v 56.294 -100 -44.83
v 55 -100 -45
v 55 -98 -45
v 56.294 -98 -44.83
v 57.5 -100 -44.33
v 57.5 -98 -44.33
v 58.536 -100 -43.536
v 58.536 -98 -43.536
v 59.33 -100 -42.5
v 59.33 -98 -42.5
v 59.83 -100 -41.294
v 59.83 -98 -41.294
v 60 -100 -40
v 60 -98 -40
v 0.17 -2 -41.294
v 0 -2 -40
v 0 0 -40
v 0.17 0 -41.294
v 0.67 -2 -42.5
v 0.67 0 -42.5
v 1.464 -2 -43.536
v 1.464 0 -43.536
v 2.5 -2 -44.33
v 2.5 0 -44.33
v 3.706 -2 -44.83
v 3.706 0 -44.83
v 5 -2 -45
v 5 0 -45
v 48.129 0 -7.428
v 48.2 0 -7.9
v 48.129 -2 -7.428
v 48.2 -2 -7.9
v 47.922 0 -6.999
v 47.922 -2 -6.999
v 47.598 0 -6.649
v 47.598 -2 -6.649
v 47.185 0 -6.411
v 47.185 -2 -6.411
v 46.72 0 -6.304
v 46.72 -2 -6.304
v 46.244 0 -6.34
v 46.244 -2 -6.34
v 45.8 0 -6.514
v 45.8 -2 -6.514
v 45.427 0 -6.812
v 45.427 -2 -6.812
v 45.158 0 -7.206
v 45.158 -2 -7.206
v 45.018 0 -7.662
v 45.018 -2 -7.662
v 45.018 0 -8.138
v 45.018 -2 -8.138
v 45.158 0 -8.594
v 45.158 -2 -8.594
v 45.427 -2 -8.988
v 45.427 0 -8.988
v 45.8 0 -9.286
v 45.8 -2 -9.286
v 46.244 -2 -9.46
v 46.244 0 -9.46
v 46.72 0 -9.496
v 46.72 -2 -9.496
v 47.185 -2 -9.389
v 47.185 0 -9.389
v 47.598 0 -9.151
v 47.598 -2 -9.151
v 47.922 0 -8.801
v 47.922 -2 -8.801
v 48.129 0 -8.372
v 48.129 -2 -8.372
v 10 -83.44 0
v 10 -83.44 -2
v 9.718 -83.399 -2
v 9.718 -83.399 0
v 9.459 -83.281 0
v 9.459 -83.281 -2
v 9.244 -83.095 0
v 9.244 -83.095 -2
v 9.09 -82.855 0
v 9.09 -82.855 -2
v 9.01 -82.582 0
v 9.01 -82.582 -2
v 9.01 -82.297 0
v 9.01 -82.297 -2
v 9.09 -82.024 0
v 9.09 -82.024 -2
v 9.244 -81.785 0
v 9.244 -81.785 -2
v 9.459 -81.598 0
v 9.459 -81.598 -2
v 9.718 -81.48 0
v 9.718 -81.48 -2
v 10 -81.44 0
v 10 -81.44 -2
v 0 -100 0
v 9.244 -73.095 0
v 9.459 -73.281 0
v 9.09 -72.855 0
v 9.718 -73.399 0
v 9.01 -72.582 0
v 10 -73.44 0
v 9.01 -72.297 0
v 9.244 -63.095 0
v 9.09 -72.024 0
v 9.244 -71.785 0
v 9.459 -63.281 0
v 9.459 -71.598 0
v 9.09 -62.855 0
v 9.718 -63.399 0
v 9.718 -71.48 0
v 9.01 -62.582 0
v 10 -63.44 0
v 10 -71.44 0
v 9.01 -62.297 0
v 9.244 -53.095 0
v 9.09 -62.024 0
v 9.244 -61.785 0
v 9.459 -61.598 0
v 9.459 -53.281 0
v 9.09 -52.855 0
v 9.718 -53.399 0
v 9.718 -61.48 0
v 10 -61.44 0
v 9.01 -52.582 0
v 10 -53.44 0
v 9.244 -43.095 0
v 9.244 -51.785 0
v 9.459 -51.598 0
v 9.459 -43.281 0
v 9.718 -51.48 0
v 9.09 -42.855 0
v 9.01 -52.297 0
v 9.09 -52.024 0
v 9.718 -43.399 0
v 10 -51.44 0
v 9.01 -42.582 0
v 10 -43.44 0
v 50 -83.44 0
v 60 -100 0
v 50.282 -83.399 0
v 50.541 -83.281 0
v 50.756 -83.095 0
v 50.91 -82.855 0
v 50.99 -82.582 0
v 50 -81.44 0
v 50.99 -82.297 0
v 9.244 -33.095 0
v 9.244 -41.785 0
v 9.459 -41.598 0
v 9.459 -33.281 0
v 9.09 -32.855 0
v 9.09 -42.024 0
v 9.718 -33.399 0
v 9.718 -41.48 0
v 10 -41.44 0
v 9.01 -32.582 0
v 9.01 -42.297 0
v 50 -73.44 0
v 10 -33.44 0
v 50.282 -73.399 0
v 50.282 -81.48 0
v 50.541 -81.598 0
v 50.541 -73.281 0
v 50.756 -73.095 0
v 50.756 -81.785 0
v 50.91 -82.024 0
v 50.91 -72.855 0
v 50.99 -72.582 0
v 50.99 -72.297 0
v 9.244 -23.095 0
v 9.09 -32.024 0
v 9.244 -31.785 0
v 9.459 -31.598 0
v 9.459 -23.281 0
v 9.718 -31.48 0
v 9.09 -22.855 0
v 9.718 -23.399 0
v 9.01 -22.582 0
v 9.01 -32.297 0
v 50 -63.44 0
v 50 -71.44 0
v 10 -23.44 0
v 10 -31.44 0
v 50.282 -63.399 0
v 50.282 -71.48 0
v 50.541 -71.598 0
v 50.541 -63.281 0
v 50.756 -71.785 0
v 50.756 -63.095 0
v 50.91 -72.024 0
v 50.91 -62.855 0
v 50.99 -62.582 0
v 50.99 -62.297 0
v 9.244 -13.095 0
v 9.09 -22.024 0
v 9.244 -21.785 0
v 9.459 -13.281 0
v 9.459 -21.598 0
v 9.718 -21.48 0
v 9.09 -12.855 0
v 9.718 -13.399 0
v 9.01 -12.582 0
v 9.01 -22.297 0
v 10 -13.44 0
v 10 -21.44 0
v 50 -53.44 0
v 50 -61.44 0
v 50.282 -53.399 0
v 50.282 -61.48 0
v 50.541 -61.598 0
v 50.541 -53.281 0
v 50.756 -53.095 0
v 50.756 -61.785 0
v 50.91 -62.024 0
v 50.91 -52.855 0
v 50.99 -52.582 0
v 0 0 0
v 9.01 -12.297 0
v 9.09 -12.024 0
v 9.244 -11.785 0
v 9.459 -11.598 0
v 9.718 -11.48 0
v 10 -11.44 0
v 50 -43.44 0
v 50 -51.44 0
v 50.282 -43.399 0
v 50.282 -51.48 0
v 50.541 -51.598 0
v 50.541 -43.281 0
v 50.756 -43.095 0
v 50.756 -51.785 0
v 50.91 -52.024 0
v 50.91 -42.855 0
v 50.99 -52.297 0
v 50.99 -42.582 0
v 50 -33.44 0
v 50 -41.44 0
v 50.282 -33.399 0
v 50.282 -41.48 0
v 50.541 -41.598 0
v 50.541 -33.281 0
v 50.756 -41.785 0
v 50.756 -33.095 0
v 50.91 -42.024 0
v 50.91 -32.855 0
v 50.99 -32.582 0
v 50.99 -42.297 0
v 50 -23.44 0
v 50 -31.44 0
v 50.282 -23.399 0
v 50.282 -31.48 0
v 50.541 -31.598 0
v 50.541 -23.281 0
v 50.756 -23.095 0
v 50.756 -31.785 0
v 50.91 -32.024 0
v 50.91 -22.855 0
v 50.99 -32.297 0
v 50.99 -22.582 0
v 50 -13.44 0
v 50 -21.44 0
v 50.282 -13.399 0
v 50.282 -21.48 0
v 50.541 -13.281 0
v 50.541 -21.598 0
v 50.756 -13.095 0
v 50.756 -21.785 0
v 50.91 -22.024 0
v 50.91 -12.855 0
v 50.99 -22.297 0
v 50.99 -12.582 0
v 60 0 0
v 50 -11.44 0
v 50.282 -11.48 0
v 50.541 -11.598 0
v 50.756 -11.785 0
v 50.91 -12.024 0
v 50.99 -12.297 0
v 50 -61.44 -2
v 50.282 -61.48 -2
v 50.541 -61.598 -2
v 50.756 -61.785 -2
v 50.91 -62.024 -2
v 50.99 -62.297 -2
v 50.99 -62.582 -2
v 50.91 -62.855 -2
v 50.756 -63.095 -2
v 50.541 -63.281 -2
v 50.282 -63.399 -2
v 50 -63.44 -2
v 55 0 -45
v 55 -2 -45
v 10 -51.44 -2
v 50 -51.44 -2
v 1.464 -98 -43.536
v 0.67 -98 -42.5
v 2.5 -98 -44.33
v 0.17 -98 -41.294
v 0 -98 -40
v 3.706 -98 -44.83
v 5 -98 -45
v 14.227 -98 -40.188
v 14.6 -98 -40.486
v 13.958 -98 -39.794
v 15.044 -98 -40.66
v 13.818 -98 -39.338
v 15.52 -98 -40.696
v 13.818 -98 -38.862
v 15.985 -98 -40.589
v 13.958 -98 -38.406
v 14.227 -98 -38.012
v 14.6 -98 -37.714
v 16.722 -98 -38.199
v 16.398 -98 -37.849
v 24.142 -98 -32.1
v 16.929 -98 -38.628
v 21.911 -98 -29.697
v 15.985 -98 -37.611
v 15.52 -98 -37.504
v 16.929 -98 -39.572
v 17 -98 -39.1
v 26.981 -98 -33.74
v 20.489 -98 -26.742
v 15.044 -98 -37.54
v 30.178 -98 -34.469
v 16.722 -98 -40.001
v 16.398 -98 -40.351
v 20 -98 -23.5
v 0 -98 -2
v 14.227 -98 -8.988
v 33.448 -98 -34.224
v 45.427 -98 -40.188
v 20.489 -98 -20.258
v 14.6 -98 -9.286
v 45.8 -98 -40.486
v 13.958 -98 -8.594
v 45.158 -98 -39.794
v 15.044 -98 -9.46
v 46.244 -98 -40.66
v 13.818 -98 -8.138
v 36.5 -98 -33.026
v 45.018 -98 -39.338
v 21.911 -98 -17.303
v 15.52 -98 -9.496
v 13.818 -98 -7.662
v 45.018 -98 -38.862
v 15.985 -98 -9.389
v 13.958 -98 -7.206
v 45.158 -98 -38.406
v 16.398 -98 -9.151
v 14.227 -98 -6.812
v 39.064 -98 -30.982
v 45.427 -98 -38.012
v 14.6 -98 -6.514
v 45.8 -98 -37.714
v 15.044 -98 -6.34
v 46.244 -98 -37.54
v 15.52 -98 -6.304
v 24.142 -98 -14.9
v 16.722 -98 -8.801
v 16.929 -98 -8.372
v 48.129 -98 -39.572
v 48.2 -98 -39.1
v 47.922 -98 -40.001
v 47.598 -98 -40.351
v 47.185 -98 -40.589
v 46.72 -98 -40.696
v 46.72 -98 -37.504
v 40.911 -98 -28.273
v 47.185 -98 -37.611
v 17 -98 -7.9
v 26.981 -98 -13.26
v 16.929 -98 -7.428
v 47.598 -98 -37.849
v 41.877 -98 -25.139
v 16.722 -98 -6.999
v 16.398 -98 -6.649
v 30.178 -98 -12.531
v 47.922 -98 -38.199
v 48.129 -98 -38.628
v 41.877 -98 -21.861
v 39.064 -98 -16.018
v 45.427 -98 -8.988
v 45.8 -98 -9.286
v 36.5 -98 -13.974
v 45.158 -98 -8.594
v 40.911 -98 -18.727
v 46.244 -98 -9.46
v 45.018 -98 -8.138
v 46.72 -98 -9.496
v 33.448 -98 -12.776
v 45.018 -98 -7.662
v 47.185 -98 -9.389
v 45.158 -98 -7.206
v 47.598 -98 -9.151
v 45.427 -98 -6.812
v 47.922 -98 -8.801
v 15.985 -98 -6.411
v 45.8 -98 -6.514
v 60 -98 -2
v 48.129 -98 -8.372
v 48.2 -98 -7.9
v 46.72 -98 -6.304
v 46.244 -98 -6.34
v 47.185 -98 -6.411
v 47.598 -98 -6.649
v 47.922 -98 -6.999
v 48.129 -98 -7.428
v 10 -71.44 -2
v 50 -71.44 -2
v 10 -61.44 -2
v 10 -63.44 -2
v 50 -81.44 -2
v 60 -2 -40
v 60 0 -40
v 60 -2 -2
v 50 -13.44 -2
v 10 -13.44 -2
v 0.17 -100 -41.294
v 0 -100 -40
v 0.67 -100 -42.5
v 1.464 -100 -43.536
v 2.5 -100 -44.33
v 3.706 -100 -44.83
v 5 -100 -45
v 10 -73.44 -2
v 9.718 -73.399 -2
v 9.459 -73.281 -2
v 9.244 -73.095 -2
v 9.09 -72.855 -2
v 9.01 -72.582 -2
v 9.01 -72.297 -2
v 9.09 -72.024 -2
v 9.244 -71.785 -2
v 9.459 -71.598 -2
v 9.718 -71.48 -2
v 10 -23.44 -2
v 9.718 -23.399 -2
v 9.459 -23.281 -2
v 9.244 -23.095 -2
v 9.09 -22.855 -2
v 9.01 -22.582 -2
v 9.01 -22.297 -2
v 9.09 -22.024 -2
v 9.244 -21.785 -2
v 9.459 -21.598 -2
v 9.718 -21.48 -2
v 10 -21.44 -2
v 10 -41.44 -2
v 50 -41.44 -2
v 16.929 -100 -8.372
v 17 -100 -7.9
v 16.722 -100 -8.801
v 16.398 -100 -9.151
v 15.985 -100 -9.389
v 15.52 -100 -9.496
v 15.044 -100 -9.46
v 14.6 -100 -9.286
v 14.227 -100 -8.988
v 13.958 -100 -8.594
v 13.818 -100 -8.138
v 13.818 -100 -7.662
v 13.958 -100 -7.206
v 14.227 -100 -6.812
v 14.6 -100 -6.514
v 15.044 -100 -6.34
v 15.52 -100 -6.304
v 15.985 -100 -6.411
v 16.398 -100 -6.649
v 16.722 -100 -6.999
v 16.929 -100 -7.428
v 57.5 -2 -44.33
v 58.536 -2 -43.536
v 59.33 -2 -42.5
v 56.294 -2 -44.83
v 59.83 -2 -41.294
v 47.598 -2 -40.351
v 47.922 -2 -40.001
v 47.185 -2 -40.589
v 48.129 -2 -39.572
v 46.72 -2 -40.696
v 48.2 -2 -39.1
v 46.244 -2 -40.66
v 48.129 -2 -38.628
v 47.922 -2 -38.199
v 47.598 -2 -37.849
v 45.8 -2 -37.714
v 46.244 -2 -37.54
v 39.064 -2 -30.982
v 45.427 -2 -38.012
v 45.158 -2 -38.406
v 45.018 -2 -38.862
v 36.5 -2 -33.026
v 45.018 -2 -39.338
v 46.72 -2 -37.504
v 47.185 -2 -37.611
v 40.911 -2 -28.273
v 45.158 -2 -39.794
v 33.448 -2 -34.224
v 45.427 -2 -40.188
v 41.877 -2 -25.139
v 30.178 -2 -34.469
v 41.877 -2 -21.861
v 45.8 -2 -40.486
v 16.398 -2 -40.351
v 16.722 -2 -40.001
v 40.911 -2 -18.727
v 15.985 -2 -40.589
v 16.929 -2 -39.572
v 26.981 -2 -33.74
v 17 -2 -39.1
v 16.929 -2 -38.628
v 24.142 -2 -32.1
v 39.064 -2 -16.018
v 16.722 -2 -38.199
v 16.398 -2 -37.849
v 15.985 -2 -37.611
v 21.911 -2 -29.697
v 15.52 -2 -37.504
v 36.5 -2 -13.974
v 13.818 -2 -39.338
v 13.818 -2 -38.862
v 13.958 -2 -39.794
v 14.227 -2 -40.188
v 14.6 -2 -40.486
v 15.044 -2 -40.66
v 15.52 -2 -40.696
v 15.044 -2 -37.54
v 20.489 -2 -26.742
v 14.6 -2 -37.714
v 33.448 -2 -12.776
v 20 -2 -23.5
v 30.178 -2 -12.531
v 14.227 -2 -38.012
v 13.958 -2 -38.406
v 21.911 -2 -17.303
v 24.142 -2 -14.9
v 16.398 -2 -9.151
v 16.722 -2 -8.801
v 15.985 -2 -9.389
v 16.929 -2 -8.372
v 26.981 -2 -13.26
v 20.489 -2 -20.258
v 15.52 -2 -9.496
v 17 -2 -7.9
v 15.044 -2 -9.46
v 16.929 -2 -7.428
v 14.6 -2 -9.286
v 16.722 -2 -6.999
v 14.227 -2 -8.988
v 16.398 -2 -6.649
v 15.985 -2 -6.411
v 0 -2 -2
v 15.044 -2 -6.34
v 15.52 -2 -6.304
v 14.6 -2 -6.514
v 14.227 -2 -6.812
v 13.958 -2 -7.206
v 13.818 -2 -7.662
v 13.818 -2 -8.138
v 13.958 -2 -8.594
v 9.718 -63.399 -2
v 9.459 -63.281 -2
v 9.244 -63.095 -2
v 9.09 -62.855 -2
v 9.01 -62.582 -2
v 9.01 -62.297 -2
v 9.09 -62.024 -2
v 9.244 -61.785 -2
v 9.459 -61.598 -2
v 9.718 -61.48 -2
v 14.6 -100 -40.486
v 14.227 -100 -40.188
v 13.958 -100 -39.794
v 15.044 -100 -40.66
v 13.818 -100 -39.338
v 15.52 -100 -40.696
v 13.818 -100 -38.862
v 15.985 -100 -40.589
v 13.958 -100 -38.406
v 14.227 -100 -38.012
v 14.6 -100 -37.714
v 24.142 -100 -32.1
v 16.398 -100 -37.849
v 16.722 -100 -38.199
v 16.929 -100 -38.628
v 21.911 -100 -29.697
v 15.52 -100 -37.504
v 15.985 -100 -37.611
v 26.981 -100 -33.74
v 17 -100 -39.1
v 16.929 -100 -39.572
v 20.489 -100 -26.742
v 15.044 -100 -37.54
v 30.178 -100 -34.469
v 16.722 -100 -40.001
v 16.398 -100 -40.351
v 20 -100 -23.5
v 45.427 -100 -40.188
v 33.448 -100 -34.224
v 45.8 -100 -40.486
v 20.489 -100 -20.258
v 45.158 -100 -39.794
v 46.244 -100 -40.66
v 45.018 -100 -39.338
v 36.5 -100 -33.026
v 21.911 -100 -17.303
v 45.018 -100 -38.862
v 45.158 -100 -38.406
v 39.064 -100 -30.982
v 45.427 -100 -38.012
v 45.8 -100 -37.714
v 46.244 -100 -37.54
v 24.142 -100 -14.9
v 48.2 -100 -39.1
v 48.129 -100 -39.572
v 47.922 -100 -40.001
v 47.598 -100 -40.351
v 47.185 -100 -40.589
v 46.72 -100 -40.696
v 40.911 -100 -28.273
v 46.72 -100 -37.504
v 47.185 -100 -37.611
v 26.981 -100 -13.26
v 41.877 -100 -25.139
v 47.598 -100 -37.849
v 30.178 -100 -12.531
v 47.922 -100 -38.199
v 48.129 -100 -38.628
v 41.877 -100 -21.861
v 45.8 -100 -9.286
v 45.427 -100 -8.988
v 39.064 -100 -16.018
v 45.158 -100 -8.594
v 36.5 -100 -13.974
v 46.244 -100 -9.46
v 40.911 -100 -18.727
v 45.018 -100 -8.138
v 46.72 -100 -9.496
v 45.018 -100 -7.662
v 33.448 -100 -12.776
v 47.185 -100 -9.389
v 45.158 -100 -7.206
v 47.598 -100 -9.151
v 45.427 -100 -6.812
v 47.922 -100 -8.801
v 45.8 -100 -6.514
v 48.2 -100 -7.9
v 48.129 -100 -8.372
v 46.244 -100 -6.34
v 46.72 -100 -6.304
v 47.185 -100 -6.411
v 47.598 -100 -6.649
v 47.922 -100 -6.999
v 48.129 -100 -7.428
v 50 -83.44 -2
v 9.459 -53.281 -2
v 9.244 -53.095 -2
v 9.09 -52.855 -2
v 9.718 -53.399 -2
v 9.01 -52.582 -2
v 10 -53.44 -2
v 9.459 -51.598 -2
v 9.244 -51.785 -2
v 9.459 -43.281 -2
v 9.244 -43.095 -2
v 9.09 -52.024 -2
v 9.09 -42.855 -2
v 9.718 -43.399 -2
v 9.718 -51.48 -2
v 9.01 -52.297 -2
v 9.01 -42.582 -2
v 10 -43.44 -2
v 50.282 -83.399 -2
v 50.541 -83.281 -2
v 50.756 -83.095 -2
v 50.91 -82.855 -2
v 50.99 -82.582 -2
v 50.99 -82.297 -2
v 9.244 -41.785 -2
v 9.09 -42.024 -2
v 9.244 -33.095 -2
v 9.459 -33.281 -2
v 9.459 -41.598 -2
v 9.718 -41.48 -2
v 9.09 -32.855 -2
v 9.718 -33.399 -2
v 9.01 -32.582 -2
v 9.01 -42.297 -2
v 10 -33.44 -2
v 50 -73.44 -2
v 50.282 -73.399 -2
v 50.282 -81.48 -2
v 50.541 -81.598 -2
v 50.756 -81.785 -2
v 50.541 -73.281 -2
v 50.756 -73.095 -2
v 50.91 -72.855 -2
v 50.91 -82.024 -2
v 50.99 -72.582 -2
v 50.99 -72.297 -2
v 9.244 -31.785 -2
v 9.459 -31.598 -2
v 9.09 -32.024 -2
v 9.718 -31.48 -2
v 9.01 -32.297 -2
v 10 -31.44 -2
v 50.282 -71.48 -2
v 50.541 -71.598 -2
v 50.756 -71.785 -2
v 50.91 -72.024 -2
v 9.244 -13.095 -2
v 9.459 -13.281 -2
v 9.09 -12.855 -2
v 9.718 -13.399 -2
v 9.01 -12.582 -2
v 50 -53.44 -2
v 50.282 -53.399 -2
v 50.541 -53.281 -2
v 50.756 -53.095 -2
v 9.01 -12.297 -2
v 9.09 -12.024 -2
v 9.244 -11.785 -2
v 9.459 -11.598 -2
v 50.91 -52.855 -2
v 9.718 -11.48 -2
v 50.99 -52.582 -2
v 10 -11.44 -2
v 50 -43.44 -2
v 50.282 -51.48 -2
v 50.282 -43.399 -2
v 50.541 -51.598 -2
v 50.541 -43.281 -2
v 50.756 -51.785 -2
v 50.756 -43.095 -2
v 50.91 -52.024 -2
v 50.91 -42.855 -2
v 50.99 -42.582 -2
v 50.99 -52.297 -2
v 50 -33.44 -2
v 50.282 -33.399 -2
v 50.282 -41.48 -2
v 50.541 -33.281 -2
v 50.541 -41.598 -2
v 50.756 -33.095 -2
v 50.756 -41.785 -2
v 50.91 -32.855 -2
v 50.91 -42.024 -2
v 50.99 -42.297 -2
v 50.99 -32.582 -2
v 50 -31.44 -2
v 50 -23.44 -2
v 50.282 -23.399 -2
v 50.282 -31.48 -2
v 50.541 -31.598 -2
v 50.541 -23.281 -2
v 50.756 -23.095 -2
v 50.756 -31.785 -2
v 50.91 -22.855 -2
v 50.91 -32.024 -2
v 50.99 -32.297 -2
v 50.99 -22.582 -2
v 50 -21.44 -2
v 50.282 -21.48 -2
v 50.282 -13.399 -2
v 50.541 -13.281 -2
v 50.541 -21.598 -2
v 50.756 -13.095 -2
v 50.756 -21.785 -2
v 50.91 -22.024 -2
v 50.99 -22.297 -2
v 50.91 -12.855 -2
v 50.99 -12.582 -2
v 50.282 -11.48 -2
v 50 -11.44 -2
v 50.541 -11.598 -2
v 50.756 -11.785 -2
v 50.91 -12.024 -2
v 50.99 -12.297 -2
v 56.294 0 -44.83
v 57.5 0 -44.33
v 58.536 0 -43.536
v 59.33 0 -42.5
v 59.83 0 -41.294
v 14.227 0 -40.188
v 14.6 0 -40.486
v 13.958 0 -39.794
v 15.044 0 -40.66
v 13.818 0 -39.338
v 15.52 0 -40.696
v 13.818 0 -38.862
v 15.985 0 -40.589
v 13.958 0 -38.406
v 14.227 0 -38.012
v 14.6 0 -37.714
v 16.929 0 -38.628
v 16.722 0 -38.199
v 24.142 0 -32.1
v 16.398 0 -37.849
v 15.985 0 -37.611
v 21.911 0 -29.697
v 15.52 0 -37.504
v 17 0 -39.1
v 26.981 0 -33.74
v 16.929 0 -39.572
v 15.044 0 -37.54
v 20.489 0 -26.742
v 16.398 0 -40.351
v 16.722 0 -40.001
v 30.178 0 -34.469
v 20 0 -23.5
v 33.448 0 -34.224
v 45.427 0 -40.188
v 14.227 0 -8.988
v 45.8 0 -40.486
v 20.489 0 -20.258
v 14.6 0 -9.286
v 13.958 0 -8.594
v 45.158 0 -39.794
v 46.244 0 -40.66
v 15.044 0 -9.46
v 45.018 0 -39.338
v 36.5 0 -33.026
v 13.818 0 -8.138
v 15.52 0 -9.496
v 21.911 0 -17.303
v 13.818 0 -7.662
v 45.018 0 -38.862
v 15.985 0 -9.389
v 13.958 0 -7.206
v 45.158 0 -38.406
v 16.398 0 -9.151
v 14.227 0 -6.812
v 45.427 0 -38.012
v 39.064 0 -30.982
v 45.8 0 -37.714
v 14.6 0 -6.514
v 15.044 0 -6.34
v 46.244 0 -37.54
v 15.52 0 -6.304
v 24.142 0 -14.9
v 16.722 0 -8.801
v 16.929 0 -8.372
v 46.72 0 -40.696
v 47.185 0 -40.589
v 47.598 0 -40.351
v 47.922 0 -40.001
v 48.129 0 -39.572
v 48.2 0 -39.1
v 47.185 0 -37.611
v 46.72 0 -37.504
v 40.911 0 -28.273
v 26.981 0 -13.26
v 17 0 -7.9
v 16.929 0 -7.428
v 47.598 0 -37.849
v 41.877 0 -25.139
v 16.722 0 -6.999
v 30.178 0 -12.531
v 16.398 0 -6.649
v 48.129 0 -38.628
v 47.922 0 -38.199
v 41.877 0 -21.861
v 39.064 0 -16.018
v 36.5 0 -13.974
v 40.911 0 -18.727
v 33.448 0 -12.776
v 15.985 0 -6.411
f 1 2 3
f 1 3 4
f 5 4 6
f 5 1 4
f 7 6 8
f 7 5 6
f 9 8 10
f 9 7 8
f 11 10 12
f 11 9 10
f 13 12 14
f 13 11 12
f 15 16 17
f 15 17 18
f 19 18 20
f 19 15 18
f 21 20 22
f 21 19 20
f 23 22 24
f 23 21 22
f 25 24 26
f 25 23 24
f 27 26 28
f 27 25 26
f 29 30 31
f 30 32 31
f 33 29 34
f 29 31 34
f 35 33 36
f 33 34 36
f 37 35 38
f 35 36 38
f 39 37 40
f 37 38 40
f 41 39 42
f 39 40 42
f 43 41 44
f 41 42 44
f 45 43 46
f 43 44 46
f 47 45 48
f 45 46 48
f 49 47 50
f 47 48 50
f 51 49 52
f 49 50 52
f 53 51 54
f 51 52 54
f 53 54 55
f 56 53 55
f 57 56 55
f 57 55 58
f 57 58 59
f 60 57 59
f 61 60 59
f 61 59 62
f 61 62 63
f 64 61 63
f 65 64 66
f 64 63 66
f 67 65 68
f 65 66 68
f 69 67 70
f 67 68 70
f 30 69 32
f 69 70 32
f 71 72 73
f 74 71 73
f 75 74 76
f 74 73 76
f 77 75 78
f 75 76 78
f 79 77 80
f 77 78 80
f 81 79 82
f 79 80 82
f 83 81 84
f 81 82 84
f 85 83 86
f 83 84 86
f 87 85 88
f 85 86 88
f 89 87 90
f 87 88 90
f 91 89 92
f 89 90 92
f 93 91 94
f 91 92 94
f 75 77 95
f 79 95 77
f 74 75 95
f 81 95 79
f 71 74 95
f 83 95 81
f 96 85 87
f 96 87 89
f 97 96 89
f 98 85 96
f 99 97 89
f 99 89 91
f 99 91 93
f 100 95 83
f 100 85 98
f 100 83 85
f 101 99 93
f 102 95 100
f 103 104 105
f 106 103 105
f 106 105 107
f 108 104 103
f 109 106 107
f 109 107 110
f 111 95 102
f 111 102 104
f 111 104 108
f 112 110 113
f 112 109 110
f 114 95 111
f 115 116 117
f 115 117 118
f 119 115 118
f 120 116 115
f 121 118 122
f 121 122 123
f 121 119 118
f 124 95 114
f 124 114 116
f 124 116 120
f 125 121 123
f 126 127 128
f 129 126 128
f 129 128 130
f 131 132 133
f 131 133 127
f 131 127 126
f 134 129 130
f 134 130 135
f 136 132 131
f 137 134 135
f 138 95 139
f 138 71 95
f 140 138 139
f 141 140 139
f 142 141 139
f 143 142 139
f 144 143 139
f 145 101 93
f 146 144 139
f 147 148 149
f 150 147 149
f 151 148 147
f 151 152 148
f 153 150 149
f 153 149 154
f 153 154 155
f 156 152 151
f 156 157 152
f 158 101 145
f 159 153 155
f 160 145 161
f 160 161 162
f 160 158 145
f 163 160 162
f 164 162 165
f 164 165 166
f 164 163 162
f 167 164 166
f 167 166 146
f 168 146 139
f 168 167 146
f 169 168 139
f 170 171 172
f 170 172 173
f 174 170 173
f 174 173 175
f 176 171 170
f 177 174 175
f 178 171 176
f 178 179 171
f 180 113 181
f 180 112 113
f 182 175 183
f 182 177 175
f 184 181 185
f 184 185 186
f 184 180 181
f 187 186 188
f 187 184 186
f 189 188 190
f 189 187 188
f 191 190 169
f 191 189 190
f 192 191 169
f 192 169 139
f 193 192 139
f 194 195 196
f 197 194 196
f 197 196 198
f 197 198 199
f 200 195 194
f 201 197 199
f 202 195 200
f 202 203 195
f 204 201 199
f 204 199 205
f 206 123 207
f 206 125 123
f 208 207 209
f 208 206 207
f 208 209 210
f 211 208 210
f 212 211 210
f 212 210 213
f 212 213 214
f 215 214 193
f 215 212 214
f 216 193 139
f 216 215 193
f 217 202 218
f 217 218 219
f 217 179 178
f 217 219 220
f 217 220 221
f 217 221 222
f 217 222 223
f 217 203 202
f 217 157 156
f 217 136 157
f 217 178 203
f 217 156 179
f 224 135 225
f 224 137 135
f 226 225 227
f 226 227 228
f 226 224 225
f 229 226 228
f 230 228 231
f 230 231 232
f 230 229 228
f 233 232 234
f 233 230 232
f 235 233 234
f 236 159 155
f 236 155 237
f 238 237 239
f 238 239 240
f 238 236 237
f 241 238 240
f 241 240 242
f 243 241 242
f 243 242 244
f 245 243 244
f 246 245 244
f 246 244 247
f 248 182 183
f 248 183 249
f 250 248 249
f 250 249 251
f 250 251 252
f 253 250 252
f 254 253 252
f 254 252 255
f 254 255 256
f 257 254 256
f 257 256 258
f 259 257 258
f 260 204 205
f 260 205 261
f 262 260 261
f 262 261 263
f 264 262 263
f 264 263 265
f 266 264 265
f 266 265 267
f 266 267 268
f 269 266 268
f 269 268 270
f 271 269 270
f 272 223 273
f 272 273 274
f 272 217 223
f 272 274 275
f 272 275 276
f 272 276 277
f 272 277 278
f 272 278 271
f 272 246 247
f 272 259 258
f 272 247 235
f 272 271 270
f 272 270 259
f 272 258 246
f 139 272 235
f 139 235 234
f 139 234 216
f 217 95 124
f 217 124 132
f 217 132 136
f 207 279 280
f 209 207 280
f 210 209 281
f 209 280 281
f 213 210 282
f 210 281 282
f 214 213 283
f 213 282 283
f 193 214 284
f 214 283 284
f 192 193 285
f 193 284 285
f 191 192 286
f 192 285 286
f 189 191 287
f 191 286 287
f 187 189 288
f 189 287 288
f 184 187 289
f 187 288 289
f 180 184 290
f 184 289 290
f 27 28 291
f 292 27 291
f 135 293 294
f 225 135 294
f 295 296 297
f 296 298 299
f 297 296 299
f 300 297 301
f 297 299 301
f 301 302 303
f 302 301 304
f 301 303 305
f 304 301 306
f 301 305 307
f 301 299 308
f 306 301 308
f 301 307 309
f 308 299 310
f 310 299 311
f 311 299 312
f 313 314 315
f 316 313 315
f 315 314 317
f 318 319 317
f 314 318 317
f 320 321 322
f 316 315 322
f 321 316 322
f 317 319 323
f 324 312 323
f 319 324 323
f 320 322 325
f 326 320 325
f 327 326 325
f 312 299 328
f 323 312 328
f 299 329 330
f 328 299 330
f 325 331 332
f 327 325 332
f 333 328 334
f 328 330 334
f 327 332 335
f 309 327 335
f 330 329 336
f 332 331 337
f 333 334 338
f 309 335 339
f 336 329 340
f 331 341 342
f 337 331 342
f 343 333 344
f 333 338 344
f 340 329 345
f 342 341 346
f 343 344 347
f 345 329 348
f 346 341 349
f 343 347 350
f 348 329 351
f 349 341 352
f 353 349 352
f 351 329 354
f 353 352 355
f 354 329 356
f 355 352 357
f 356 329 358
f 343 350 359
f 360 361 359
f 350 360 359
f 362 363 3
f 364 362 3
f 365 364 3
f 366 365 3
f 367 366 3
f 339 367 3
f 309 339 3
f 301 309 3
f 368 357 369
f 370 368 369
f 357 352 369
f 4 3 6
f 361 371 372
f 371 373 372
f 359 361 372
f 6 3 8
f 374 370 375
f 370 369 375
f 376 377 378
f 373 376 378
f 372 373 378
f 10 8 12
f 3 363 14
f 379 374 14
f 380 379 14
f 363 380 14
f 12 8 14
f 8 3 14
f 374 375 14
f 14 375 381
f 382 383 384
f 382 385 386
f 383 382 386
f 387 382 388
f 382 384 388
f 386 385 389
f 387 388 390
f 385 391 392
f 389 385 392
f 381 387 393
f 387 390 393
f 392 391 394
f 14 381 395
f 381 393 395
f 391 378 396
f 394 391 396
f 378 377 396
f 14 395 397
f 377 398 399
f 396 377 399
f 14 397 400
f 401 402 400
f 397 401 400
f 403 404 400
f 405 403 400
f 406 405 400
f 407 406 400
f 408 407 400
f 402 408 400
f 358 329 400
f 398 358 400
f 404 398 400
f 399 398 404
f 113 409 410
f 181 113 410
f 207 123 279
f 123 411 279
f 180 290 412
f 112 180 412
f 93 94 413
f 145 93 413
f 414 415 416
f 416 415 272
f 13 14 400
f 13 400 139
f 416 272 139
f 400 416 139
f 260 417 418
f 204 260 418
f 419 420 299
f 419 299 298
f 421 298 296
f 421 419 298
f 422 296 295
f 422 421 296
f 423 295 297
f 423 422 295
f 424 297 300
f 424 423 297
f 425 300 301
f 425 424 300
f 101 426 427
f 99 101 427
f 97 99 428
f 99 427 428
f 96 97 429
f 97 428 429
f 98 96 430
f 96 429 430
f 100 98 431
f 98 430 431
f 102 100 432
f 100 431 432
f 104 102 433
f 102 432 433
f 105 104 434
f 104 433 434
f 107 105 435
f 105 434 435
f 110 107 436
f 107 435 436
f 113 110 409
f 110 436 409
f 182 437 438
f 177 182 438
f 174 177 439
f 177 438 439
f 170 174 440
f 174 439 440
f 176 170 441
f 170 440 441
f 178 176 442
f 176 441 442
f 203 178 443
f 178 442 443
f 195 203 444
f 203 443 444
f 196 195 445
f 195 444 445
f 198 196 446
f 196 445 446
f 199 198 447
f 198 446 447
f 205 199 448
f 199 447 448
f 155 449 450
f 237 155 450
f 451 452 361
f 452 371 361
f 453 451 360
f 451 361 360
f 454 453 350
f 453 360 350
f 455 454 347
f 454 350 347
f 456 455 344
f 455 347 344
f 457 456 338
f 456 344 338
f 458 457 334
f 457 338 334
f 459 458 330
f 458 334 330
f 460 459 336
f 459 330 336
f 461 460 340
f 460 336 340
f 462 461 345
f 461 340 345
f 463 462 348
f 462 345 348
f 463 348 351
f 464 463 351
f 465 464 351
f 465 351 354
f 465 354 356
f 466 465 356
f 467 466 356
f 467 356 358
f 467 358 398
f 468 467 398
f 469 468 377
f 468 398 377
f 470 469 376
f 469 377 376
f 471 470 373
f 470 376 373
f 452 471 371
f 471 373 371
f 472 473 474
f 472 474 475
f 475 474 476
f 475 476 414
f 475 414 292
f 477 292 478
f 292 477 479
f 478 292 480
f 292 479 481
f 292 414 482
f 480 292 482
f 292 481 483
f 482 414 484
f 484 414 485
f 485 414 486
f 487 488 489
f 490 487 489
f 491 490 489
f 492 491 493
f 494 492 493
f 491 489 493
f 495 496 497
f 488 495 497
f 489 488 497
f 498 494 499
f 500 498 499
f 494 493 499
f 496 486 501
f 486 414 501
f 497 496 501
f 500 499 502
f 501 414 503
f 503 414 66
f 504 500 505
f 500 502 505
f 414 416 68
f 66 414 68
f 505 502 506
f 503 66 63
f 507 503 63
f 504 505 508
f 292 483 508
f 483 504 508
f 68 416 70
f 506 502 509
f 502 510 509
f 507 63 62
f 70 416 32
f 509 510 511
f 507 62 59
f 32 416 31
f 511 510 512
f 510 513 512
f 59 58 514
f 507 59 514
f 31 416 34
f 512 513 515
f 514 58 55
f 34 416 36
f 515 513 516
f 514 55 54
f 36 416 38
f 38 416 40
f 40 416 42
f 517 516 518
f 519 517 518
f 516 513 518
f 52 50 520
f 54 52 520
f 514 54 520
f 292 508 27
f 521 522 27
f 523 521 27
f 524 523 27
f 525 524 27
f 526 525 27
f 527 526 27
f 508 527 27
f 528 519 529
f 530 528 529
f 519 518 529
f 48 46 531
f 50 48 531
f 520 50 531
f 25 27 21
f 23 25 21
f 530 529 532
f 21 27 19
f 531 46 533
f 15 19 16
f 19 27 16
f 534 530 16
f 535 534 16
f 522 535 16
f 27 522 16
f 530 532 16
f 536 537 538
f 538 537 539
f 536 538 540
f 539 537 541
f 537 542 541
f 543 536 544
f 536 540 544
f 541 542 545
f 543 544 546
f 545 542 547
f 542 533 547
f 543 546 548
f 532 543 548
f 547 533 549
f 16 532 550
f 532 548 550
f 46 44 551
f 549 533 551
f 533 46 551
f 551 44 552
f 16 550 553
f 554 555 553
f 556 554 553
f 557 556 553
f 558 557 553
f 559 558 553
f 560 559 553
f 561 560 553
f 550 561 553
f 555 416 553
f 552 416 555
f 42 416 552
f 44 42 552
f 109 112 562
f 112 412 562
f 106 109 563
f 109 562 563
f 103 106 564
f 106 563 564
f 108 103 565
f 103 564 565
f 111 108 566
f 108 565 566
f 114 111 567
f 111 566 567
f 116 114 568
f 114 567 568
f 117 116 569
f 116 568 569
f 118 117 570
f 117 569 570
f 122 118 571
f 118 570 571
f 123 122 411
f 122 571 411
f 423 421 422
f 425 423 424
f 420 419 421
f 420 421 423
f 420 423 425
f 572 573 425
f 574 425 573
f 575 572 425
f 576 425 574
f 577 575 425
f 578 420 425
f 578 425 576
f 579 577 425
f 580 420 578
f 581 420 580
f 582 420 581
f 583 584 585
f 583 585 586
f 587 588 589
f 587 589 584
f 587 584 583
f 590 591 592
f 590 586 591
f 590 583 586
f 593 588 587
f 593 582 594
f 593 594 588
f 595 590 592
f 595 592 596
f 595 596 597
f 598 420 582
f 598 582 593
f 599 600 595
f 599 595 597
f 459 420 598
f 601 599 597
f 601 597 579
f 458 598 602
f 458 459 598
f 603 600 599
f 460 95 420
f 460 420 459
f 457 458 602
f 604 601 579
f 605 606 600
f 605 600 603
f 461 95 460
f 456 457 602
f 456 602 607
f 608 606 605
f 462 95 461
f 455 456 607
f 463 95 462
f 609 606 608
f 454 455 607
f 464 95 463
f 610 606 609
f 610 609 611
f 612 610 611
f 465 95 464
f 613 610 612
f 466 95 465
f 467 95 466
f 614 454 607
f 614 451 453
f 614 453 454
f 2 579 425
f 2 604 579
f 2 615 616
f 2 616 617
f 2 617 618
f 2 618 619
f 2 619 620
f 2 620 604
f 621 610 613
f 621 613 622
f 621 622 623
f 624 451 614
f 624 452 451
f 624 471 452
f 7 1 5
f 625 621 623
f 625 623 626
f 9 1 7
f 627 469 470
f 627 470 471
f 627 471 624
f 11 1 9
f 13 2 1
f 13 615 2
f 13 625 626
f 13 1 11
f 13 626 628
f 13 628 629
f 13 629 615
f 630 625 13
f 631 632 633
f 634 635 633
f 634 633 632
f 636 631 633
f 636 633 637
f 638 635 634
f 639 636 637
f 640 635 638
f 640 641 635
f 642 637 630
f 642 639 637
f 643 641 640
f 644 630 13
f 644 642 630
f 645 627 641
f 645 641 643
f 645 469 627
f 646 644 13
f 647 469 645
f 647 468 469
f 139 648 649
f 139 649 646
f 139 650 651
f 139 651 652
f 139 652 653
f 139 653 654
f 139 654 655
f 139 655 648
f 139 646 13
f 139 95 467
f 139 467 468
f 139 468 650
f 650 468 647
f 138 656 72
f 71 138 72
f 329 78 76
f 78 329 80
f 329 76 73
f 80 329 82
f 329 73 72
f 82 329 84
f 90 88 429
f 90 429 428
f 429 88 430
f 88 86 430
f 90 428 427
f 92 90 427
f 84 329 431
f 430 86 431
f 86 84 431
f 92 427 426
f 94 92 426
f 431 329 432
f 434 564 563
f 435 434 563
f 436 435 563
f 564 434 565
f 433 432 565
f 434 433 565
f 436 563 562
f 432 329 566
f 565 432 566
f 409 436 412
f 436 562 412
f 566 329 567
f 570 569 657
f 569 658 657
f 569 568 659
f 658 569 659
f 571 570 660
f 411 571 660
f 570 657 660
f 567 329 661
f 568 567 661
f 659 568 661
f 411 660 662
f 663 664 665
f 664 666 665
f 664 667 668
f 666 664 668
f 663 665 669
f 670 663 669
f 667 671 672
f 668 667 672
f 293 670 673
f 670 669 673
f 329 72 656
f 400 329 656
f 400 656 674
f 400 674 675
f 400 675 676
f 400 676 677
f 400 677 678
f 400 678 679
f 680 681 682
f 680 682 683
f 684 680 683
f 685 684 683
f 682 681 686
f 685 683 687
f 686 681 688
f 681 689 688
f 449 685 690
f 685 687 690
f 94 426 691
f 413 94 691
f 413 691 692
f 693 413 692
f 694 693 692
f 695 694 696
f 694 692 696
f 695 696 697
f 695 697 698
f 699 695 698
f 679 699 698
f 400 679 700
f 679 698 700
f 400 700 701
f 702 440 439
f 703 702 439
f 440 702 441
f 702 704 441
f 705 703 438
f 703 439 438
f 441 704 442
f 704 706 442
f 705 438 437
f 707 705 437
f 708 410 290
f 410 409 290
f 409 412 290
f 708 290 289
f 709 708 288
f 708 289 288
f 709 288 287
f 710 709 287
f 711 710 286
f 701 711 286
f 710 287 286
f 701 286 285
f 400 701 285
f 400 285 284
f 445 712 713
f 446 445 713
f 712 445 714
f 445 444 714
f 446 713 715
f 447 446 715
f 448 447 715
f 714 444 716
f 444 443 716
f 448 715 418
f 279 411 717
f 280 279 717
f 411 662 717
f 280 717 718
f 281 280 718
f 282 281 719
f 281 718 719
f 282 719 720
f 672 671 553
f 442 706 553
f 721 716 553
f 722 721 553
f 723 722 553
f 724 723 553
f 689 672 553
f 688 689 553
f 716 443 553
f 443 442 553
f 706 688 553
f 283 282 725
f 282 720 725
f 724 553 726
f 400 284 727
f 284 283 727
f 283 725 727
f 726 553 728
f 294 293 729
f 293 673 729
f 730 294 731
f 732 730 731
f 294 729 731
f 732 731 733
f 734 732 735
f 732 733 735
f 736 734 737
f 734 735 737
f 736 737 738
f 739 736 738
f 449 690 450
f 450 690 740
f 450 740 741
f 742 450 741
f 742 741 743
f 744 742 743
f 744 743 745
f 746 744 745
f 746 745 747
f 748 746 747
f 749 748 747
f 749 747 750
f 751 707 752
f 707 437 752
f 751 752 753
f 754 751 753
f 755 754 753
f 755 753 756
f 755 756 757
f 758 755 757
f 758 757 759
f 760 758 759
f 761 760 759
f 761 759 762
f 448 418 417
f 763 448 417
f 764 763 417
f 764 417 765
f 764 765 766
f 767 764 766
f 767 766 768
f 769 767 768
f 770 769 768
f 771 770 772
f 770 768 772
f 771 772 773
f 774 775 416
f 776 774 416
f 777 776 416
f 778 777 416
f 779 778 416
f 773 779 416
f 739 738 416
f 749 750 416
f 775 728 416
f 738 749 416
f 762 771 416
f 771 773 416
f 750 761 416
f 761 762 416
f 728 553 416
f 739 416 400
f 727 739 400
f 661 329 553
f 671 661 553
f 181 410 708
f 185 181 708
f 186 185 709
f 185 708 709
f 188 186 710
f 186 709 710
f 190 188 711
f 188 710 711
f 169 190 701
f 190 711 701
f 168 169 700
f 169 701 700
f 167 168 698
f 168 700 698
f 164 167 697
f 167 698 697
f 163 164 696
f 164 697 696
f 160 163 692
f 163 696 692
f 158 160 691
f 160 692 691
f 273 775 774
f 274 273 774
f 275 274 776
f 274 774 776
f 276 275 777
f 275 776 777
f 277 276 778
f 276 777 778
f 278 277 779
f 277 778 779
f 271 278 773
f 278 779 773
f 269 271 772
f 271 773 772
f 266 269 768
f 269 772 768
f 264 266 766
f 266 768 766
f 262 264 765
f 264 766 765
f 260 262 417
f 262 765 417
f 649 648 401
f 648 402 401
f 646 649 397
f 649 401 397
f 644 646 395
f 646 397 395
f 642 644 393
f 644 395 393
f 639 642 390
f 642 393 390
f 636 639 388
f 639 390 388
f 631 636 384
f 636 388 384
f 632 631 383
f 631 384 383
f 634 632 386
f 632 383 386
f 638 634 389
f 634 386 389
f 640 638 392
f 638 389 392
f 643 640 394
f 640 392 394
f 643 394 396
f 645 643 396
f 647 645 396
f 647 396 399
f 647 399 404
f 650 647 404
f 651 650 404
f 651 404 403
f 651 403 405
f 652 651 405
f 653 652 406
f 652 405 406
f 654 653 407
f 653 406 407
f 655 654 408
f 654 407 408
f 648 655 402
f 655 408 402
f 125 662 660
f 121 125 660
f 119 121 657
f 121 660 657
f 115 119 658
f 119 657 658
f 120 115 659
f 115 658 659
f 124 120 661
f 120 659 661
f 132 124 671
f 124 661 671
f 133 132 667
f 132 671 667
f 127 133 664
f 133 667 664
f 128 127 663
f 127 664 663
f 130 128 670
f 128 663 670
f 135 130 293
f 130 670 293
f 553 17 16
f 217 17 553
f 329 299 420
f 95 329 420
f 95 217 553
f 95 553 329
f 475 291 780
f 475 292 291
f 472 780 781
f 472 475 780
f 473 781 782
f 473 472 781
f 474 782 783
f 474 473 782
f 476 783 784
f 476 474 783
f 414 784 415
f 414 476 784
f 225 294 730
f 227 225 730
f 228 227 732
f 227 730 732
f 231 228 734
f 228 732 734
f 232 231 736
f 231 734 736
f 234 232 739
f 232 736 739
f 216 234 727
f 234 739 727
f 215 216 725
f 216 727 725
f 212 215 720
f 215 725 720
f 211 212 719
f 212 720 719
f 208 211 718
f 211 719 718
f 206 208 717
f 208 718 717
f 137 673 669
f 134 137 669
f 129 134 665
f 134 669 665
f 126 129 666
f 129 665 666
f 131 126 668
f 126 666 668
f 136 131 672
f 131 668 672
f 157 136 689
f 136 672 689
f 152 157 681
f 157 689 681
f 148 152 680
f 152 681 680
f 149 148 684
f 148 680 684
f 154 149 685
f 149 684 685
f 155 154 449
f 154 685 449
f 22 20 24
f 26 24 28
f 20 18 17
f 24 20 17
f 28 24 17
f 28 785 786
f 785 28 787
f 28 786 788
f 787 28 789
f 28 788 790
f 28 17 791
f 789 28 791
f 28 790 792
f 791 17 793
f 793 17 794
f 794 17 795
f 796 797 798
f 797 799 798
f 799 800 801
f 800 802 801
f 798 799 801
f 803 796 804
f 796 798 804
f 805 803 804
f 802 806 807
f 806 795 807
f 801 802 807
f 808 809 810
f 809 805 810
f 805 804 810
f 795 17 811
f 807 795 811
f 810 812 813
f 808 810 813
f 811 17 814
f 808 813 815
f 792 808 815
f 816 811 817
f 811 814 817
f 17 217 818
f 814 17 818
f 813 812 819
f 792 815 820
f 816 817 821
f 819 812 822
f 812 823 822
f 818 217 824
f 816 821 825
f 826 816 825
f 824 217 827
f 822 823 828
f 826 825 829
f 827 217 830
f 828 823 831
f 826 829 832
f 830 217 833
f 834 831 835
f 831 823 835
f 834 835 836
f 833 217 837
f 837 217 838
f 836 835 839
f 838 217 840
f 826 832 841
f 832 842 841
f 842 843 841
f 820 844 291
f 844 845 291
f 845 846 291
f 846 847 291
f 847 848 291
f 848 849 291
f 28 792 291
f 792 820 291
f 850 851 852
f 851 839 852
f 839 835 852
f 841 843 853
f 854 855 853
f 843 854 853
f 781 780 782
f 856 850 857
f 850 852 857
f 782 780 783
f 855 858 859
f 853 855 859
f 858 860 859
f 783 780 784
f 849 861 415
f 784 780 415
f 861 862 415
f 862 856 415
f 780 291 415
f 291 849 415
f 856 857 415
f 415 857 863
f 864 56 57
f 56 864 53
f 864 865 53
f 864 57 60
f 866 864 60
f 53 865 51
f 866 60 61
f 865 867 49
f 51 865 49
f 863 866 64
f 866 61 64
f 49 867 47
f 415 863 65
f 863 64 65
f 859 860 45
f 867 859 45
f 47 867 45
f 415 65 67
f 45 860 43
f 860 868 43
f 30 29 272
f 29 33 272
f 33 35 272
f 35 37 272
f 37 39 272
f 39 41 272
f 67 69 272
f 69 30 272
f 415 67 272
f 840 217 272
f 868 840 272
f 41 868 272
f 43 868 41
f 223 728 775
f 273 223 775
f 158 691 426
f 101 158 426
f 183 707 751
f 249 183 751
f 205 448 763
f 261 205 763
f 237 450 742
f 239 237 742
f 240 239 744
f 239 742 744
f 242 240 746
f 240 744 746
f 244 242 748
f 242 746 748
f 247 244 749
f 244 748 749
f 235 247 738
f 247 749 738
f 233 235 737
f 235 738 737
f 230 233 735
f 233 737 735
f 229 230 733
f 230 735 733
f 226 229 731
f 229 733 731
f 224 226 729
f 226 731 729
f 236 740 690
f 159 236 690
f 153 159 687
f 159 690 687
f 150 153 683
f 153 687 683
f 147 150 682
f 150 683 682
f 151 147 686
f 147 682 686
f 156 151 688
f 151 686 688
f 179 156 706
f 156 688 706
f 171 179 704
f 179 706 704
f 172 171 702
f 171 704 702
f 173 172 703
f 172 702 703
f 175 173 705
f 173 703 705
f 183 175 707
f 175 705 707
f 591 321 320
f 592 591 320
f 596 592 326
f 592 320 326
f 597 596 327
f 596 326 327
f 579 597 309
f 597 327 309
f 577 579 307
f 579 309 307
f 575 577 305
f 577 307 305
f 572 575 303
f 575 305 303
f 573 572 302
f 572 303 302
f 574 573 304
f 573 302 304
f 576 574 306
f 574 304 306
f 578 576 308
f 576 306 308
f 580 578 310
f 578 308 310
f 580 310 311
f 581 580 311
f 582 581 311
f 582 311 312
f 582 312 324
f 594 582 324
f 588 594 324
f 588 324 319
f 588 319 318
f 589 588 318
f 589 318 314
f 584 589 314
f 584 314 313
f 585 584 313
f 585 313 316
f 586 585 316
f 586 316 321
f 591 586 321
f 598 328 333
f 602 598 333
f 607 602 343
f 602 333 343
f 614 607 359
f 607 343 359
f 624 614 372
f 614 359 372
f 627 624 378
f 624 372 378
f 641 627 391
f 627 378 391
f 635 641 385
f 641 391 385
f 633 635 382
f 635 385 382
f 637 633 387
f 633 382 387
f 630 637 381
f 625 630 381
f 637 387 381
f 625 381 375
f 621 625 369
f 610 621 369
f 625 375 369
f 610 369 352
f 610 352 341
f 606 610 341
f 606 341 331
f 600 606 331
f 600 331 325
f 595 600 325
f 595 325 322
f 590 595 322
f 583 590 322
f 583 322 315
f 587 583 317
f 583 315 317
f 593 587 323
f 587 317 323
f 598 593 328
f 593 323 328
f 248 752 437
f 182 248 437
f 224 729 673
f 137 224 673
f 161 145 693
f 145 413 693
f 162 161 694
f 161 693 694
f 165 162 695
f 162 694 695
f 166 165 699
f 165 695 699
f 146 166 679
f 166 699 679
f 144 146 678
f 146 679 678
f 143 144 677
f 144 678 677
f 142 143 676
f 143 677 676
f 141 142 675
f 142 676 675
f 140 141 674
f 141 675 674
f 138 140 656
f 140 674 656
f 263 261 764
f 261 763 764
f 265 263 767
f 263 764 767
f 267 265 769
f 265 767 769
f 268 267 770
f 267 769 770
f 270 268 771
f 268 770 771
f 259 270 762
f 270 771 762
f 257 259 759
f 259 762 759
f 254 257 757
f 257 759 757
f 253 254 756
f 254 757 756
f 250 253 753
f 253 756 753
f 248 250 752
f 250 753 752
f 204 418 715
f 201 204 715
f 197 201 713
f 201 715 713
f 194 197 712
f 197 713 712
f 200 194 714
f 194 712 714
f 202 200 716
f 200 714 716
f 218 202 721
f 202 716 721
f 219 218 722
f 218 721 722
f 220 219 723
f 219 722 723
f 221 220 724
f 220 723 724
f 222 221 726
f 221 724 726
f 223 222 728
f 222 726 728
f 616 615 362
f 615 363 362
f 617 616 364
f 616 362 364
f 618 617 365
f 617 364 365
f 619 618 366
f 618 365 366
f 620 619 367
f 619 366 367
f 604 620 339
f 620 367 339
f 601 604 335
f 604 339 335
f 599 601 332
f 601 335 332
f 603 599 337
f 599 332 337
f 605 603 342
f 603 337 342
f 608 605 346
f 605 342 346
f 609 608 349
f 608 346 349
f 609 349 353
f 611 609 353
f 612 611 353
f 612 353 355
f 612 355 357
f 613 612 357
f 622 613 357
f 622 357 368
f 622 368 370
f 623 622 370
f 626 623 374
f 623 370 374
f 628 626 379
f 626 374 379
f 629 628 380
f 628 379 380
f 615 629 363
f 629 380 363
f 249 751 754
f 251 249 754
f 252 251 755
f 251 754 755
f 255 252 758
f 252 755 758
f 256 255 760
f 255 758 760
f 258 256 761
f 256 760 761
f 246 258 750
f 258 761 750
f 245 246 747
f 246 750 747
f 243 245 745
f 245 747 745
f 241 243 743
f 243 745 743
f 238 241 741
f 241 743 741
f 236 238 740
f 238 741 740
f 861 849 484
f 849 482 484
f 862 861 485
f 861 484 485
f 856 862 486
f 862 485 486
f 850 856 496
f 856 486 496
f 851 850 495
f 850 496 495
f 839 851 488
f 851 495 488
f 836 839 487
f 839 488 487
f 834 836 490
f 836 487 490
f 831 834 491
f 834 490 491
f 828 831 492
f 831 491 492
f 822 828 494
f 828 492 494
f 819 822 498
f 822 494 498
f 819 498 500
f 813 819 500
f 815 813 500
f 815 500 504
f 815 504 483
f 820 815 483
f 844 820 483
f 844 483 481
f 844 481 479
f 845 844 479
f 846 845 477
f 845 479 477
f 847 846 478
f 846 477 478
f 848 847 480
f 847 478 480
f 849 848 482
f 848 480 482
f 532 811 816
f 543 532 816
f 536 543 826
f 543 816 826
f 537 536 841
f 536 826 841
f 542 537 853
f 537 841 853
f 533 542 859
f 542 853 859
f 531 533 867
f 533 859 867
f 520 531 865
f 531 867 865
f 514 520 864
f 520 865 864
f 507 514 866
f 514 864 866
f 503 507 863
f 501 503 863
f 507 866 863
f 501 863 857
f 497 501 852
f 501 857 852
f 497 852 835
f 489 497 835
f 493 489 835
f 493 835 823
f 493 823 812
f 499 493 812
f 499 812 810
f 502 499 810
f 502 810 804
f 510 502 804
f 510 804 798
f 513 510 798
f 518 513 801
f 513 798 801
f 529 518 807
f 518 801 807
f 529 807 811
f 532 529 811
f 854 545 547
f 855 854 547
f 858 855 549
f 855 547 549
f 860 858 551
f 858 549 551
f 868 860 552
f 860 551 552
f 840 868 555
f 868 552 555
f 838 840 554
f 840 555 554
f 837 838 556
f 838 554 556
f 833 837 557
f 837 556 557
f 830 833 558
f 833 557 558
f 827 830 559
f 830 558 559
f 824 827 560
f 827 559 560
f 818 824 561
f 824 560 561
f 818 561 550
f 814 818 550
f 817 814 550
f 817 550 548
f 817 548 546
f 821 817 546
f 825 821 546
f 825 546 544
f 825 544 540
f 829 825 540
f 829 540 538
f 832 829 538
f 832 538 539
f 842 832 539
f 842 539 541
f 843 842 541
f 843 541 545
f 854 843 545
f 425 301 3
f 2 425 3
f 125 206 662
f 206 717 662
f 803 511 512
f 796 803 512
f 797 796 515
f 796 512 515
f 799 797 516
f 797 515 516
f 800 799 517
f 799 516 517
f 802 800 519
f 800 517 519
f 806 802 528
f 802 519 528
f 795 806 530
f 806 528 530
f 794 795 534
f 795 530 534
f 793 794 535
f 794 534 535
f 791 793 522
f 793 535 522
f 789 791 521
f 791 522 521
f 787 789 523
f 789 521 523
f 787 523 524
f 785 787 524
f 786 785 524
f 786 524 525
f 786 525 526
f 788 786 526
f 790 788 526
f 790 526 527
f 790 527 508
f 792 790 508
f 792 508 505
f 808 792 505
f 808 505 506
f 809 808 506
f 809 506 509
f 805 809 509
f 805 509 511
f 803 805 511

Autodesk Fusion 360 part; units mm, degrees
sketch "Boceto6" plane through (0, 0, 0) normal (0, 0, 1) x (1, 0, 0)
  line L0 (0, 0) -> (60, 0)
  line L1 (60, 0) -> (60, -100)
  line L2 (0, 0) -> (0, -100)
  line L3 (0, -100) -> (60, -100)
  line L4 (0, 0) -> (60, 0)
  line L5 (60, 0) -> (60, -2)
  line L6 (60, -2) -> (0, -2)
  line L7 (0, -100) -> (0, -98.9254)
  line L8 (0, -100) -> (0, -98)
  line L9 (0, -98) -> (60, -98)
  line L10 (30, 0) -> (30, -104.8793) construction
  line L11 (50, -51.4397) -> (10, -51.4397) construction
  line L12 (10, -53.4397) -> (50, -53.4397) construction
  line L13 (10, -51.4397) -> (50, -51.4397)
  line L14 (50, -53.4397) -> (10, -53.4397)
  arc A0 (10, -51.4397) -> (10, -53.4397) centre (10, -52.4397) ccw
  arc A1 (50, -53.4397) -> (50, -51.4397) centre (50, -52.4397) ccw
  line L15 (10, -83.4397) -> (50, -83.4397) construction
  arc A2 (10, -81.4397) -> (10, -83.4397) centre (10, -82.4397) ccw
  arc A3 (50, -83.4397) -> (50, -81.4397) centre (50, -82.4397) ccw
  line L16 (50, -81.4397) -> (10, -81.4397) construction
  line L17 (10, -81.4397) -> (50, -81.4397)
  line L18 (50, -83.4397) -> (10, -83.4397)
  line L19 (10, -73.4397) -> (50, -73.4397) construction
  arc A4 (10, -71.4397) -> (10, -73.4397) centre (10, -72.4397) ccw
  arc A5 (50, -73.4397) -> (50, -71.4397) centre (50, -72.4397) ccw
  line L20 (50, -71.4397) -> (10, -71.4397) construction
  line L21 (10, -71.4397) -> (50, -71.4397)
  line L22 (50, -73.4397) -> (10, -73.4397)
  line L23 (10, -63.4397) -> (50, -63.4397) construction
  arc A6 (10, -61.4397) -> (10, -63.4397) centre (10, -62.4397) ccw
  arc A7 (50, -63.4397) -> (50, -61.4397) centre (50, -62.4397) ccw
  line L24 (50, -61.4397) -> (10, -61.4397) construction
  line L25 (10, -61.4397) -> (50, -61.4397)
  line L26 (50, -63.4397) -> (10, -63.4397)
  line L27 (10, -43.4397) -> (50, -43.4397) construction
  arc A8 (10, -41.4397) -> (10, -43.4397) centre (10, -42.4397) ccw
  arc A9 (50, -43.4397) -> (50, -41.4397) centre (50, -42.4397) ccw
  line L28 (50, -41.4397) -> (10, -41.4397) construction
  line L29 (10, -41.4397) -> (50, -41.4397)
  line L30 (50, -43.4397) -> (10, -43.4397)
  line L31 (10, -33.4397) -> (50, -33.4397) construction
  arc A10 (10, -31.4397) -> (10, -33.4397) centre (10, -32.4397) ccw
  arc A11 (50, -33.4397) -> (50, -31.4397) centre (50, -32.4397) ccw
  line L32 (50, -31.4397) -> (10, -31.4397) construction
  line L33 (10, -31.4397) -> (50, -31.4397)
  line L34 (50, -33.4397) -> (10, -33.4397)
  line L35 (10, -23.4397) -> (50, -23.4397) construction
  arc A12 (10, -21.4397) -> (10, -23.4397) centre (10, -22.4397) ccw
  arc A13 (50, -23.4397) -> (50, -21.4397) centre (50, -22.4397) ccw
  line L36 (50, -21.4397) -> (10, -21.4397) construction
  line L37 (10, -21.4397) -> (50, -21.4397)
  line L38 (50, -23.4397) -> (10, -23.4397)
  line L39 (10, -13.4397) -> (50, -13.4397) construction
  arc A14 (10, -11.4397) -> (10, -13.4397) centre (10, -12.4397) ccw
  arc A15 (50, -13.4397) -> (50, -11.4397) centre (50, -12.4397) ccw
  line L40 (50, -11.4397) -> (10, -11.4397) construction
  line L41 (10, -11.4397) -> (50, -11.4397)
  line L42 (50, -13.4397) -> (10, -13.4397)
  dimension "d3" = 60
  dimension "d4" = 100
  dimension "d7" = 2
  dimension "d8" = 2
  dimension "d48" = 1
  dimension "d49" = 40
  dimension "d50" = 2
  dimension "d51" = 40
  dimension "d52" = 2
  dimension "d53" = 2
  dimension "d56" = 0
  dimension "d57" = 40
extrude "Extruir1" add sketch "Boceto6" against normal blind 2 contours L0 L1 L2 L4 L5 L6 | L1 L2 L6 L9 | L1 L2 L3 L7 L8 L9 | L13 L14 A0 A1 | A2 A3 L17 L18 | A4 A5 L21 L22 | A6 A7 L25 L26 | A8 A9 L29 L30 | A10 A11 L33 L34 | A12 A13 L37 L38 | A14 A15 L41 L42
extrude "Extruir2" add sketch "Boceto6" against normal blind 45 contours L0 L1 L2 L4 L5 L6
extrude "Extruir3" add sketch "Boceto6" against normal blind 45 contours L1 L2 L3 L7 L8 L9
fillet "Empalme1" radius 5 1 edges at (60, -99, -45)
fillet "Empalme2" radius 5 2 edges at (60, -1, -45) (0, -99, -45)
fillet "Empalme3" radius 5 1 edges at (0, -1, -45)
sketch "Boceto7" plane through (0, 0, -45) normal (0, 0, -1) x (1, 0, 0)
  line L0 (5, 2) -> (5, 0)
  line L1 (5, 0) -> (55, 0)
  line L2 (55, 0) -> (55, 2)
  line L3 (55, 2) -> (5, 2)
  line L4 (0, 0) -> (0, -2)
  line L5 (0, -2) -> (60, -2)
  line L6 (60, -2) -> (60, 102)
  dimension "d31" = 2
  dimension "d32" = 60
  dimension "d33" = 104
sketch "Boceto8" plane through (0, -42, 0) normal (0, -1, 0) x (1, 0, 0)
  arc A0 (10, -39.5) -> (15, -44.5) centre (15, -39.5) ccw
  line L0 (15, -44.5) -> (47, -44.5)
  arc A1 (47, -44.5) -> (52, -39.5) centre (47, -39.5) ccw
  line L1 (52, -39.5) -> (52, -7.5)
  arc A2 (52, -7.5) -> (47, -2.5) centre (47, -7.5) ccw
  line L2 (47, -2.5) -> (15, -2.5)
  arc A3 (15, -2.5) -> (10, -7.5) centre (15, -7.5) ccw
  line L3 (10, -7.5) -> (10, -15.5)
  line L4 (10, -15.5) -> (6, -15.5)
  line L5 (6, -15.5) -> (6, -31.5)
  line L6 (6, -31.5) -> (10, -31.5)
  line L7 (10, -31.5) -> (10, -39.5)
  circle A4 centre (46.6, -7.9) radius 3
  circle A5 centre (46.6, -39.1) radius 3
  circle A6 centre (15.4, -7.9) radius 3
  circle A7 centre (15.4, -39.1) radius 3
  circle A8 centre (31, -23.5) radius 4.6
  circle A9 centre (15.4, -7.9) radius 1.6
  circle A10 centre (46.6, -7.9) radius 1.6
  circle A11 centre (46.6, -39.1) radius 1.6
  circle A12 centre (15.4, -39.1) radius 1.6
  dimension "d34" = 3.2
  dimension "d35" = 3.2
  dimension "d36" = 3.2
  dimension "d37" = 3.2
extrude "Extruir4" cut sketch "Boceto8" along normal blind 120 and the other way blind 100 contours A9 | A10 | A11 | A12
sketch "Boceto9" plane through (0, 0.2, 0) normal (0, 1, 0) x (-1, 0, 0)
  circle A0 centre (-31, -23.5) radius 11
  circle A1 centre (-31, -23.5) radius 4.6
  circle A2 centre (-31, -23.5) radius 11
  dimension "d42" = 22
extrude "Extruir5" cut sketch "Boceto9" along normal blind 0 and the other way blind 200 contours A0 A2 | A1
extrude "Extruir6" cut sketch "Boceto6" along normal mid plane 20 contours L13 L14 A0 A1 | A2 A3 L17 L18 | A4 A5 L21 L22 | A6 A7 L25 L26 | A8 A9 L29 L30 | A10 A11 L33 L34 | A12 A13 L37 L38 | A14 A15 L41 L42
